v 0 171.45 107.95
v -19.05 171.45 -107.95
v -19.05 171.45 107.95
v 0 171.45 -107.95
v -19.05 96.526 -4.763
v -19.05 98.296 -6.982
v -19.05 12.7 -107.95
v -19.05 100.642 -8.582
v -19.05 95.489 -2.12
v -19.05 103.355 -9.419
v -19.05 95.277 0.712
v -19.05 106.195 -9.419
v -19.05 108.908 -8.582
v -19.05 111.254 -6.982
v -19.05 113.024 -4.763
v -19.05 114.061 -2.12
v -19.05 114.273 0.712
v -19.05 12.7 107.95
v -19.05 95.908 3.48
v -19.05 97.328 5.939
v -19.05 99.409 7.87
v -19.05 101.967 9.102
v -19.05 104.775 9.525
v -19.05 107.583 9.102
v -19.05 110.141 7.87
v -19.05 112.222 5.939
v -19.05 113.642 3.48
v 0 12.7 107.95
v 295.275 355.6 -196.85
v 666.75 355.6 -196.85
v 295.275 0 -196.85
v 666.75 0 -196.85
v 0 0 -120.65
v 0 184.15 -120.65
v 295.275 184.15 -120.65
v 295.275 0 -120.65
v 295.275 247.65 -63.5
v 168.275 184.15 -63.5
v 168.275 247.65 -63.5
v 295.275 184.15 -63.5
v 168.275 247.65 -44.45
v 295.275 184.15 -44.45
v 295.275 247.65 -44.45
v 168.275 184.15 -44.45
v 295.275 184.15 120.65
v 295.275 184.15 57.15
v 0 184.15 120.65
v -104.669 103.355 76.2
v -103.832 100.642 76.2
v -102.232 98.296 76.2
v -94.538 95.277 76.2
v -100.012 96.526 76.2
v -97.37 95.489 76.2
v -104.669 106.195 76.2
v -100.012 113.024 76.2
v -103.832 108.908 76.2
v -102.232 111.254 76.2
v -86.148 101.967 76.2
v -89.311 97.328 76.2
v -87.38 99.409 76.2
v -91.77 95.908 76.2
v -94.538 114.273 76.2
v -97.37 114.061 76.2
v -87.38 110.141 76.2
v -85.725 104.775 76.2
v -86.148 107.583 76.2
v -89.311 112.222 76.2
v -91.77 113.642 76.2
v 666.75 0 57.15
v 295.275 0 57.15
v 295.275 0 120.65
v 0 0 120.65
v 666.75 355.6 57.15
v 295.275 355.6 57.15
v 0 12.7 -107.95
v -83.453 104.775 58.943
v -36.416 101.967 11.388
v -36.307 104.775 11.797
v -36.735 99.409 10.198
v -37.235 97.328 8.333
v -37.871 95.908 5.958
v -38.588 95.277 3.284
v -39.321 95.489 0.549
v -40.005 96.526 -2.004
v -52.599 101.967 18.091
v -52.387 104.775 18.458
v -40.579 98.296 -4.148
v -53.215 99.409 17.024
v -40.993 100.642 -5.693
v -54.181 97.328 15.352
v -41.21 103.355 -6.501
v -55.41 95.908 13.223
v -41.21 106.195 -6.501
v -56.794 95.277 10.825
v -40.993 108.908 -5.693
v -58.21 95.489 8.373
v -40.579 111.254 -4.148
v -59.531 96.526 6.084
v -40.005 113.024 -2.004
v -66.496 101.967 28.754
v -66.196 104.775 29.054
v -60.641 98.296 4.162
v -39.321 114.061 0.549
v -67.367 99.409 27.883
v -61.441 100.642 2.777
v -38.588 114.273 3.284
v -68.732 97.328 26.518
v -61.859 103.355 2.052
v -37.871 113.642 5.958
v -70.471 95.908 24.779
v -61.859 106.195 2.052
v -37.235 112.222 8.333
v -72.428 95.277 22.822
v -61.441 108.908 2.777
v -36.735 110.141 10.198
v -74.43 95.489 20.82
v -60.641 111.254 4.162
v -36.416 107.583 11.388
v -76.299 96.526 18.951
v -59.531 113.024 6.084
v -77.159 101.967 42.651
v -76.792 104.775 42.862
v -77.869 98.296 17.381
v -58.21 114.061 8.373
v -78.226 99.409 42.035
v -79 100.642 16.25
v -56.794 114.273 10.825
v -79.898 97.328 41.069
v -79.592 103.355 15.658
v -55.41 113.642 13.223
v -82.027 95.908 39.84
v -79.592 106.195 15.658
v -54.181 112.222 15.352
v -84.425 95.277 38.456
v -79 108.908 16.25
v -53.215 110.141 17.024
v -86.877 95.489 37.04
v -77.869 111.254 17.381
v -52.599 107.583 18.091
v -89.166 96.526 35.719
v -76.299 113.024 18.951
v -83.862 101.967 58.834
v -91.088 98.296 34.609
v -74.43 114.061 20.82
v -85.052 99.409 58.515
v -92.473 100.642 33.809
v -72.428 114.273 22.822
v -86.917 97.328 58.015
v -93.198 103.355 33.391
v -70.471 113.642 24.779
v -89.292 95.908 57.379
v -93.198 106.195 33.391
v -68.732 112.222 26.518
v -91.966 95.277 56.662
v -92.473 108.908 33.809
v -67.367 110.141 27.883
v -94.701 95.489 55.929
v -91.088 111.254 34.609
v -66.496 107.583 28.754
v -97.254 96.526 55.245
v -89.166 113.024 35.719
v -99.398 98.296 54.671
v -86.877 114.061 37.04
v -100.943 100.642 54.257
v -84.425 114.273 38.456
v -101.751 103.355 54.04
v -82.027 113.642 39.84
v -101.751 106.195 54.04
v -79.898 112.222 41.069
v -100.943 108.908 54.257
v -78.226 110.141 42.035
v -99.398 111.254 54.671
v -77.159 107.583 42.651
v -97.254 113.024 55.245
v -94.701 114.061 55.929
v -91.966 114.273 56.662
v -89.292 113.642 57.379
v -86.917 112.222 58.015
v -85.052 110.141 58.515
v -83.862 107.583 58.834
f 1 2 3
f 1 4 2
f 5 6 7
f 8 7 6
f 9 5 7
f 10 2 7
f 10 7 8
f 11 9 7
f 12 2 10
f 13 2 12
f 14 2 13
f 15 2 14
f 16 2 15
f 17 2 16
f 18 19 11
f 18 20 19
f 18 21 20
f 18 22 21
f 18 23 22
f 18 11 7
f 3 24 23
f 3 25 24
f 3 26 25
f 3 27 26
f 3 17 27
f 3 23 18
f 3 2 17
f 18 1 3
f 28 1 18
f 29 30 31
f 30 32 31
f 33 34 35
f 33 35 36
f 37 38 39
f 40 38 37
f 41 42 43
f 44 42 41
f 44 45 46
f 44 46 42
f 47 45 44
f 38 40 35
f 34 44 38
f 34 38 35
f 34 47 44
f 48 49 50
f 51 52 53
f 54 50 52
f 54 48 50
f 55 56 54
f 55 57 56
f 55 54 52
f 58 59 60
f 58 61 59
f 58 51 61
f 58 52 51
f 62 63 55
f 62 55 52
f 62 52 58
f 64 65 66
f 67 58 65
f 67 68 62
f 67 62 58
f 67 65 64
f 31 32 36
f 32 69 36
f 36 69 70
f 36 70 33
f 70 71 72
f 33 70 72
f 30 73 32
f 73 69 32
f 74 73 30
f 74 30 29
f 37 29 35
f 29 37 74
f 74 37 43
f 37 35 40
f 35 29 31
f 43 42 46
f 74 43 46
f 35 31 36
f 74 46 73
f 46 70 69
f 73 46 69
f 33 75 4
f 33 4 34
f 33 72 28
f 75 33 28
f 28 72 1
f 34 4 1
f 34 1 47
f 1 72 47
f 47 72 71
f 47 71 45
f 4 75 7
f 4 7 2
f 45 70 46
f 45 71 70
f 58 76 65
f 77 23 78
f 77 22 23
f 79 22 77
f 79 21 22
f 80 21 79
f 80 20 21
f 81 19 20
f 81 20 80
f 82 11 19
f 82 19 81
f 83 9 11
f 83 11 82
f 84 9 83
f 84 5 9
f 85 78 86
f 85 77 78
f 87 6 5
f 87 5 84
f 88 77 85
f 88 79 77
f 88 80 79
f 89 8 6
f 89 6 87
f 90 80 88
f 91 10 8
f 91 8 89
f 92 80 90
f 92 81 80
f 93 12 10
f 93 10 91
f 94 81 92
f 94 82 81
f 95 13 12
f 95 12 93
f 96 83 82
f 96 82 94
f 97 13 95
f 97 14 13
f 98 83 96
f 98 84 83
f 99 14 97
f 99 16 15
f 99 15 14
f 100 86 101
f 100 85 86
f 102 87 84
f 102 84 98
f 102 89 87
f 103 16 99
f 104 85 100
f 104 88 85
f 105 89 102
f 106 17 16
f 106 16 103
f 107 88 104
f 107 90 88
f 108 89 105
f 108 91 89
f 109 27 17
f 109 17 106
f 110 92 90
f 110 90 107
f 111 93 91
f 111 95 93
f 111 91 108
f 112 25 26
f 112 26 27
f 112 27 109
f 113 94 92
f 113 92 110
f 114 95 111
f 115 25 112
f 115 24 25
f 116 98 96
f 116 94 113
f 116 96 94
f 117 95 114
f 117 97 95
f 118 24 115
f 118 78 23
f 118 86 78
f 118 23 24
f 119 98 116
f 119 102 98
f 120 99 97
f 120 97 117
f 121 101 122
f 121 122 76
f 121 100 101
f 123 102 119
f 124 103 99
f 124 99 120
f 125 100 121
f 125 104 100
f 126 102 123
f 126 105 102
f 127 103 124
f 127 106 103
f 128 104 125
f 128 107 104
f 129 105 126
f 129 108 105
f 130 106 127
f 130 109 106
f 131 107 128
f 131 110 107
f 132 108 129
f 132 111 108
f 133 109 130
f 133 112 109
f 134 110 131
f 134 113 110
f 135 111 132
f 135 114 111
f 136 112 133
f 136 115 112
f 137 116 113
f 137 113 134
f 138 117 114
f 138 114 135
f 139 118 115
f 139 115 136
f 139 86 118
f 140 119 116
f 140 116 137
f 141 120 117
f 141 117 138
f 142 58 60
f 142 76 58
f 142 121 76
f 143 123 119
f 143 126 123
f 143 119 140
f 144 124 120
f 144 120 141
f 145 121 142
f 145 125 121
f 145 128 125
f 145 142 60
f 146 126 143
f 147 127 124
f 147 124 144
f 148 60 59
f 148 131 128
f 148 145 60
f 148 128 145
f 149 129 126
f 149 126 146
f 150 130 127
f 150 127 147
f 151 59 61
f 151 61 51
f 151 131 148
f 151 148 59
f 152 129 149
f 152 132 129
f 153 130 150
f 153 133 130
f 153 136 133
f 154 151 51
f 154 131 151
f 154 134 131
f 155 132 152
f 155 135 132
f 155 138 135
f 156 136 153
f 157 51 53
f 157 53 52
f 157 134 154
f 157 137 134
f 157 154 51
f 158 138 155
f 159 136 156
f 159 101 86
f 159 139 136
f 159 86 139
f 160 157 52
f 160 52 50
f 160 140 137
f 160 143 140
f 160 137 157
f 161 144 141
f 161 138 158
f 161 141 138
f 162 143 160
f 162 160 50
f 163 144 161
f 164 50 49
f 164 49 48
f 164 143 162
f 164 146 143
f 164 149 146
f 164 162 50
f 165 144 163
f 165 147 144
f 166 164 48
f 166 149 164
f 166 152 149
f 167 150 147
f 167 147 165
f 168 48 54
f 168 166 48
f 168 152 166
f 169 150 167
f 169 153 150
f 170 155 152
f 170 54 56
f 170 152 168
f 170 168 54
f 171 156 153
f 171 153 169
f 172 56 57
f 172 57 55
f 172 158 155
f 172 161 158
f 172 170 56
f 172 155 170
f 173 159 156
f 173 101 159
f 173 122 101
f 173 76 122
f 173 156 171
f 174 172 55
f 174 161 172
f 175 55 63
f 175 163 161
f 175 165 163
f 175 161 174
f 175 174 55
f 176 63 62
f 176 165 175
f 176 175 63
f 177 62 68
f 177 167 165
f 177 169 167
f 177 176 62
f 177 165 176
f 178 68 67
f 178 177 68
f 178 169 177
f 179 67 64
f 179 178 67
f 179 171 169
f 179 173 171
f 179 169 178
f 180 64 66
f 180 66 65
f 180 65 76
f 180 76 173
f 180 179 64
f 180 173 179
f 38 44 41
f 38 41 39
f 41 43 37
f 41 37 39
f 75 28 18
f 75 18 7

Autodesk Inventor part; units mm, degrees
ref_plane "YZ Plane" through (0, 0, 0) normal (1, 0, 0) x (0, 1, 0)
sketch "Sketch1" plane through (0, 0, 0) normal (1, 0, 0) x (0, 1, 0)
  line L0 (0, 120.65) -> (184.15, 120.65)
  line L1 (184.15, 120.65) -> (184.15, -120.65)
  line L2 (184.15, -120.65) -> (0, -120.65)
  line L3 (0, -120.65) -> (0, 120.65)
  point P0 (0, 0)
  point P1 (0, 0)
  dimension "d0" = 184.15
  dimension "d1" = 241.3
extrude "Extrusion1" add sketch "Sketch1" along normal blind 295.275
sketch "Sketch2" plane through (0, 0, 0) normal (-1, 0, 0) x (0, 0, 1)
  line L0 (120.65, 0) -> (120.65, 184.15) construction
  line L1 (120.65, 184.15) -> (-120.65, 184.15) construction
  line L2 (-120.65, 184.15) -> (-120.65, 0) construction
  line L3 (-120.65, 0) -> (120.65, 0) construction
  line L4 (-107.95, 171.45) -> (107.95, 171.45)
  line L5 (107.95, 171.45) -> (107.95, 12.7)
  line L6 (107.95, 12.7) -> (-107.95, 12.7)
  line L7 (-107.95, 12.7) -> (-107.95, 171.45)
  point P0 (0, 0)
  dimension "d4" = 12.7
extrude "Extrusion2" add sketch "Sketch2" along normal blind 19.05
ref_plane "Work Plane1" through (0, 104.775, 0) normal (0, 1, 0) x (-1, 0, 0)
sketch "Sketch3" plane through (0, 104.775, 0) normal (0, 1, 0) x (-1, 0, 0)
  line L0 (0, 120.65) -> (0, -120.65) construction
  line L1 (133.2378, 0) -> (-22.2063, 0) construction
  line L2 (0, 0) -> (19.05, 0)
  arc A0 (19.05, 0) -> (95.25, 76.2) centre (19.05, 76.2) ccw
  dimension "d8" = 19.05
  dimension "d22" = 76.2
sketch "Sketch4" plane through (0, 0, 0) normal (-1, 0, 0) x (0, 0, 1)
  circle A0 centre (0, 104.775) radius 9.525
  point P0 (0, 0)
  dimension "d9" = 19.05
sweep "Sweep1" add profiles "Sketch4" path "Sketch3"
sketch "Sketch5" plane through (0, 0, 0) normal (0, 1, 0) x (-1, 0, 0)
  line L0 (-295.275, 120.65) -> (-295.275, -120.65) construction
  line L1 (-295.275, 57.15) -> (-666.75, 57.15)
  line L2 (-666.75, 57.15) -> (-666.75, -196.85)
  line L3 (-666.75, -196.85) -> (-295.275, -196.85)
  line L4 (-295.275, -196.85) -> (-295.275, 57.15)
  line L5 (0, -120.65) -> (0, 120.65) construction
  point P0 (0, 0)
  dimension "d12" = 666.75
  dimension "d13" = 76.2
  dimension "d14" = 254
extrude "Extrusion3" add sketch "Sketch5" along normal blind 355.6
sketch "Sketch6" plane through (0, 0, 0) normal (0, 1, 0) x (-1, 0, 0)
  line L0 (-168.275, -63.5) -> (-295.275, -63.5)
  line L1 (-295.275, -63.5) -> (-295.275, -44.45)
  line L2 (-295.275, -44.45) -> (-168.275, -44.45)
  line L3 (-168.275, -44.45) -> (-168.275, -63.5)
  line L4 (-295.275, -196.85) -> (-295.275, 57.15) construction
  line L5 (0, -120.65) -> (-295.275, -120.65) construction
  point P0 (0, 0)
  dimension "d17" = 127
  dimension "d18" = 19.05
  dimension "d19" = 57.15
extrude "Extrusion4" add sketch "Sketch6" along normal blind 247.65
ref_plane "Work Plane2" through (295.275, 0, -196.85) normal (-1, 0, 0) x (0, 0, 1)
split_face "Split1"
properties part number "Welder" material "Steel"
